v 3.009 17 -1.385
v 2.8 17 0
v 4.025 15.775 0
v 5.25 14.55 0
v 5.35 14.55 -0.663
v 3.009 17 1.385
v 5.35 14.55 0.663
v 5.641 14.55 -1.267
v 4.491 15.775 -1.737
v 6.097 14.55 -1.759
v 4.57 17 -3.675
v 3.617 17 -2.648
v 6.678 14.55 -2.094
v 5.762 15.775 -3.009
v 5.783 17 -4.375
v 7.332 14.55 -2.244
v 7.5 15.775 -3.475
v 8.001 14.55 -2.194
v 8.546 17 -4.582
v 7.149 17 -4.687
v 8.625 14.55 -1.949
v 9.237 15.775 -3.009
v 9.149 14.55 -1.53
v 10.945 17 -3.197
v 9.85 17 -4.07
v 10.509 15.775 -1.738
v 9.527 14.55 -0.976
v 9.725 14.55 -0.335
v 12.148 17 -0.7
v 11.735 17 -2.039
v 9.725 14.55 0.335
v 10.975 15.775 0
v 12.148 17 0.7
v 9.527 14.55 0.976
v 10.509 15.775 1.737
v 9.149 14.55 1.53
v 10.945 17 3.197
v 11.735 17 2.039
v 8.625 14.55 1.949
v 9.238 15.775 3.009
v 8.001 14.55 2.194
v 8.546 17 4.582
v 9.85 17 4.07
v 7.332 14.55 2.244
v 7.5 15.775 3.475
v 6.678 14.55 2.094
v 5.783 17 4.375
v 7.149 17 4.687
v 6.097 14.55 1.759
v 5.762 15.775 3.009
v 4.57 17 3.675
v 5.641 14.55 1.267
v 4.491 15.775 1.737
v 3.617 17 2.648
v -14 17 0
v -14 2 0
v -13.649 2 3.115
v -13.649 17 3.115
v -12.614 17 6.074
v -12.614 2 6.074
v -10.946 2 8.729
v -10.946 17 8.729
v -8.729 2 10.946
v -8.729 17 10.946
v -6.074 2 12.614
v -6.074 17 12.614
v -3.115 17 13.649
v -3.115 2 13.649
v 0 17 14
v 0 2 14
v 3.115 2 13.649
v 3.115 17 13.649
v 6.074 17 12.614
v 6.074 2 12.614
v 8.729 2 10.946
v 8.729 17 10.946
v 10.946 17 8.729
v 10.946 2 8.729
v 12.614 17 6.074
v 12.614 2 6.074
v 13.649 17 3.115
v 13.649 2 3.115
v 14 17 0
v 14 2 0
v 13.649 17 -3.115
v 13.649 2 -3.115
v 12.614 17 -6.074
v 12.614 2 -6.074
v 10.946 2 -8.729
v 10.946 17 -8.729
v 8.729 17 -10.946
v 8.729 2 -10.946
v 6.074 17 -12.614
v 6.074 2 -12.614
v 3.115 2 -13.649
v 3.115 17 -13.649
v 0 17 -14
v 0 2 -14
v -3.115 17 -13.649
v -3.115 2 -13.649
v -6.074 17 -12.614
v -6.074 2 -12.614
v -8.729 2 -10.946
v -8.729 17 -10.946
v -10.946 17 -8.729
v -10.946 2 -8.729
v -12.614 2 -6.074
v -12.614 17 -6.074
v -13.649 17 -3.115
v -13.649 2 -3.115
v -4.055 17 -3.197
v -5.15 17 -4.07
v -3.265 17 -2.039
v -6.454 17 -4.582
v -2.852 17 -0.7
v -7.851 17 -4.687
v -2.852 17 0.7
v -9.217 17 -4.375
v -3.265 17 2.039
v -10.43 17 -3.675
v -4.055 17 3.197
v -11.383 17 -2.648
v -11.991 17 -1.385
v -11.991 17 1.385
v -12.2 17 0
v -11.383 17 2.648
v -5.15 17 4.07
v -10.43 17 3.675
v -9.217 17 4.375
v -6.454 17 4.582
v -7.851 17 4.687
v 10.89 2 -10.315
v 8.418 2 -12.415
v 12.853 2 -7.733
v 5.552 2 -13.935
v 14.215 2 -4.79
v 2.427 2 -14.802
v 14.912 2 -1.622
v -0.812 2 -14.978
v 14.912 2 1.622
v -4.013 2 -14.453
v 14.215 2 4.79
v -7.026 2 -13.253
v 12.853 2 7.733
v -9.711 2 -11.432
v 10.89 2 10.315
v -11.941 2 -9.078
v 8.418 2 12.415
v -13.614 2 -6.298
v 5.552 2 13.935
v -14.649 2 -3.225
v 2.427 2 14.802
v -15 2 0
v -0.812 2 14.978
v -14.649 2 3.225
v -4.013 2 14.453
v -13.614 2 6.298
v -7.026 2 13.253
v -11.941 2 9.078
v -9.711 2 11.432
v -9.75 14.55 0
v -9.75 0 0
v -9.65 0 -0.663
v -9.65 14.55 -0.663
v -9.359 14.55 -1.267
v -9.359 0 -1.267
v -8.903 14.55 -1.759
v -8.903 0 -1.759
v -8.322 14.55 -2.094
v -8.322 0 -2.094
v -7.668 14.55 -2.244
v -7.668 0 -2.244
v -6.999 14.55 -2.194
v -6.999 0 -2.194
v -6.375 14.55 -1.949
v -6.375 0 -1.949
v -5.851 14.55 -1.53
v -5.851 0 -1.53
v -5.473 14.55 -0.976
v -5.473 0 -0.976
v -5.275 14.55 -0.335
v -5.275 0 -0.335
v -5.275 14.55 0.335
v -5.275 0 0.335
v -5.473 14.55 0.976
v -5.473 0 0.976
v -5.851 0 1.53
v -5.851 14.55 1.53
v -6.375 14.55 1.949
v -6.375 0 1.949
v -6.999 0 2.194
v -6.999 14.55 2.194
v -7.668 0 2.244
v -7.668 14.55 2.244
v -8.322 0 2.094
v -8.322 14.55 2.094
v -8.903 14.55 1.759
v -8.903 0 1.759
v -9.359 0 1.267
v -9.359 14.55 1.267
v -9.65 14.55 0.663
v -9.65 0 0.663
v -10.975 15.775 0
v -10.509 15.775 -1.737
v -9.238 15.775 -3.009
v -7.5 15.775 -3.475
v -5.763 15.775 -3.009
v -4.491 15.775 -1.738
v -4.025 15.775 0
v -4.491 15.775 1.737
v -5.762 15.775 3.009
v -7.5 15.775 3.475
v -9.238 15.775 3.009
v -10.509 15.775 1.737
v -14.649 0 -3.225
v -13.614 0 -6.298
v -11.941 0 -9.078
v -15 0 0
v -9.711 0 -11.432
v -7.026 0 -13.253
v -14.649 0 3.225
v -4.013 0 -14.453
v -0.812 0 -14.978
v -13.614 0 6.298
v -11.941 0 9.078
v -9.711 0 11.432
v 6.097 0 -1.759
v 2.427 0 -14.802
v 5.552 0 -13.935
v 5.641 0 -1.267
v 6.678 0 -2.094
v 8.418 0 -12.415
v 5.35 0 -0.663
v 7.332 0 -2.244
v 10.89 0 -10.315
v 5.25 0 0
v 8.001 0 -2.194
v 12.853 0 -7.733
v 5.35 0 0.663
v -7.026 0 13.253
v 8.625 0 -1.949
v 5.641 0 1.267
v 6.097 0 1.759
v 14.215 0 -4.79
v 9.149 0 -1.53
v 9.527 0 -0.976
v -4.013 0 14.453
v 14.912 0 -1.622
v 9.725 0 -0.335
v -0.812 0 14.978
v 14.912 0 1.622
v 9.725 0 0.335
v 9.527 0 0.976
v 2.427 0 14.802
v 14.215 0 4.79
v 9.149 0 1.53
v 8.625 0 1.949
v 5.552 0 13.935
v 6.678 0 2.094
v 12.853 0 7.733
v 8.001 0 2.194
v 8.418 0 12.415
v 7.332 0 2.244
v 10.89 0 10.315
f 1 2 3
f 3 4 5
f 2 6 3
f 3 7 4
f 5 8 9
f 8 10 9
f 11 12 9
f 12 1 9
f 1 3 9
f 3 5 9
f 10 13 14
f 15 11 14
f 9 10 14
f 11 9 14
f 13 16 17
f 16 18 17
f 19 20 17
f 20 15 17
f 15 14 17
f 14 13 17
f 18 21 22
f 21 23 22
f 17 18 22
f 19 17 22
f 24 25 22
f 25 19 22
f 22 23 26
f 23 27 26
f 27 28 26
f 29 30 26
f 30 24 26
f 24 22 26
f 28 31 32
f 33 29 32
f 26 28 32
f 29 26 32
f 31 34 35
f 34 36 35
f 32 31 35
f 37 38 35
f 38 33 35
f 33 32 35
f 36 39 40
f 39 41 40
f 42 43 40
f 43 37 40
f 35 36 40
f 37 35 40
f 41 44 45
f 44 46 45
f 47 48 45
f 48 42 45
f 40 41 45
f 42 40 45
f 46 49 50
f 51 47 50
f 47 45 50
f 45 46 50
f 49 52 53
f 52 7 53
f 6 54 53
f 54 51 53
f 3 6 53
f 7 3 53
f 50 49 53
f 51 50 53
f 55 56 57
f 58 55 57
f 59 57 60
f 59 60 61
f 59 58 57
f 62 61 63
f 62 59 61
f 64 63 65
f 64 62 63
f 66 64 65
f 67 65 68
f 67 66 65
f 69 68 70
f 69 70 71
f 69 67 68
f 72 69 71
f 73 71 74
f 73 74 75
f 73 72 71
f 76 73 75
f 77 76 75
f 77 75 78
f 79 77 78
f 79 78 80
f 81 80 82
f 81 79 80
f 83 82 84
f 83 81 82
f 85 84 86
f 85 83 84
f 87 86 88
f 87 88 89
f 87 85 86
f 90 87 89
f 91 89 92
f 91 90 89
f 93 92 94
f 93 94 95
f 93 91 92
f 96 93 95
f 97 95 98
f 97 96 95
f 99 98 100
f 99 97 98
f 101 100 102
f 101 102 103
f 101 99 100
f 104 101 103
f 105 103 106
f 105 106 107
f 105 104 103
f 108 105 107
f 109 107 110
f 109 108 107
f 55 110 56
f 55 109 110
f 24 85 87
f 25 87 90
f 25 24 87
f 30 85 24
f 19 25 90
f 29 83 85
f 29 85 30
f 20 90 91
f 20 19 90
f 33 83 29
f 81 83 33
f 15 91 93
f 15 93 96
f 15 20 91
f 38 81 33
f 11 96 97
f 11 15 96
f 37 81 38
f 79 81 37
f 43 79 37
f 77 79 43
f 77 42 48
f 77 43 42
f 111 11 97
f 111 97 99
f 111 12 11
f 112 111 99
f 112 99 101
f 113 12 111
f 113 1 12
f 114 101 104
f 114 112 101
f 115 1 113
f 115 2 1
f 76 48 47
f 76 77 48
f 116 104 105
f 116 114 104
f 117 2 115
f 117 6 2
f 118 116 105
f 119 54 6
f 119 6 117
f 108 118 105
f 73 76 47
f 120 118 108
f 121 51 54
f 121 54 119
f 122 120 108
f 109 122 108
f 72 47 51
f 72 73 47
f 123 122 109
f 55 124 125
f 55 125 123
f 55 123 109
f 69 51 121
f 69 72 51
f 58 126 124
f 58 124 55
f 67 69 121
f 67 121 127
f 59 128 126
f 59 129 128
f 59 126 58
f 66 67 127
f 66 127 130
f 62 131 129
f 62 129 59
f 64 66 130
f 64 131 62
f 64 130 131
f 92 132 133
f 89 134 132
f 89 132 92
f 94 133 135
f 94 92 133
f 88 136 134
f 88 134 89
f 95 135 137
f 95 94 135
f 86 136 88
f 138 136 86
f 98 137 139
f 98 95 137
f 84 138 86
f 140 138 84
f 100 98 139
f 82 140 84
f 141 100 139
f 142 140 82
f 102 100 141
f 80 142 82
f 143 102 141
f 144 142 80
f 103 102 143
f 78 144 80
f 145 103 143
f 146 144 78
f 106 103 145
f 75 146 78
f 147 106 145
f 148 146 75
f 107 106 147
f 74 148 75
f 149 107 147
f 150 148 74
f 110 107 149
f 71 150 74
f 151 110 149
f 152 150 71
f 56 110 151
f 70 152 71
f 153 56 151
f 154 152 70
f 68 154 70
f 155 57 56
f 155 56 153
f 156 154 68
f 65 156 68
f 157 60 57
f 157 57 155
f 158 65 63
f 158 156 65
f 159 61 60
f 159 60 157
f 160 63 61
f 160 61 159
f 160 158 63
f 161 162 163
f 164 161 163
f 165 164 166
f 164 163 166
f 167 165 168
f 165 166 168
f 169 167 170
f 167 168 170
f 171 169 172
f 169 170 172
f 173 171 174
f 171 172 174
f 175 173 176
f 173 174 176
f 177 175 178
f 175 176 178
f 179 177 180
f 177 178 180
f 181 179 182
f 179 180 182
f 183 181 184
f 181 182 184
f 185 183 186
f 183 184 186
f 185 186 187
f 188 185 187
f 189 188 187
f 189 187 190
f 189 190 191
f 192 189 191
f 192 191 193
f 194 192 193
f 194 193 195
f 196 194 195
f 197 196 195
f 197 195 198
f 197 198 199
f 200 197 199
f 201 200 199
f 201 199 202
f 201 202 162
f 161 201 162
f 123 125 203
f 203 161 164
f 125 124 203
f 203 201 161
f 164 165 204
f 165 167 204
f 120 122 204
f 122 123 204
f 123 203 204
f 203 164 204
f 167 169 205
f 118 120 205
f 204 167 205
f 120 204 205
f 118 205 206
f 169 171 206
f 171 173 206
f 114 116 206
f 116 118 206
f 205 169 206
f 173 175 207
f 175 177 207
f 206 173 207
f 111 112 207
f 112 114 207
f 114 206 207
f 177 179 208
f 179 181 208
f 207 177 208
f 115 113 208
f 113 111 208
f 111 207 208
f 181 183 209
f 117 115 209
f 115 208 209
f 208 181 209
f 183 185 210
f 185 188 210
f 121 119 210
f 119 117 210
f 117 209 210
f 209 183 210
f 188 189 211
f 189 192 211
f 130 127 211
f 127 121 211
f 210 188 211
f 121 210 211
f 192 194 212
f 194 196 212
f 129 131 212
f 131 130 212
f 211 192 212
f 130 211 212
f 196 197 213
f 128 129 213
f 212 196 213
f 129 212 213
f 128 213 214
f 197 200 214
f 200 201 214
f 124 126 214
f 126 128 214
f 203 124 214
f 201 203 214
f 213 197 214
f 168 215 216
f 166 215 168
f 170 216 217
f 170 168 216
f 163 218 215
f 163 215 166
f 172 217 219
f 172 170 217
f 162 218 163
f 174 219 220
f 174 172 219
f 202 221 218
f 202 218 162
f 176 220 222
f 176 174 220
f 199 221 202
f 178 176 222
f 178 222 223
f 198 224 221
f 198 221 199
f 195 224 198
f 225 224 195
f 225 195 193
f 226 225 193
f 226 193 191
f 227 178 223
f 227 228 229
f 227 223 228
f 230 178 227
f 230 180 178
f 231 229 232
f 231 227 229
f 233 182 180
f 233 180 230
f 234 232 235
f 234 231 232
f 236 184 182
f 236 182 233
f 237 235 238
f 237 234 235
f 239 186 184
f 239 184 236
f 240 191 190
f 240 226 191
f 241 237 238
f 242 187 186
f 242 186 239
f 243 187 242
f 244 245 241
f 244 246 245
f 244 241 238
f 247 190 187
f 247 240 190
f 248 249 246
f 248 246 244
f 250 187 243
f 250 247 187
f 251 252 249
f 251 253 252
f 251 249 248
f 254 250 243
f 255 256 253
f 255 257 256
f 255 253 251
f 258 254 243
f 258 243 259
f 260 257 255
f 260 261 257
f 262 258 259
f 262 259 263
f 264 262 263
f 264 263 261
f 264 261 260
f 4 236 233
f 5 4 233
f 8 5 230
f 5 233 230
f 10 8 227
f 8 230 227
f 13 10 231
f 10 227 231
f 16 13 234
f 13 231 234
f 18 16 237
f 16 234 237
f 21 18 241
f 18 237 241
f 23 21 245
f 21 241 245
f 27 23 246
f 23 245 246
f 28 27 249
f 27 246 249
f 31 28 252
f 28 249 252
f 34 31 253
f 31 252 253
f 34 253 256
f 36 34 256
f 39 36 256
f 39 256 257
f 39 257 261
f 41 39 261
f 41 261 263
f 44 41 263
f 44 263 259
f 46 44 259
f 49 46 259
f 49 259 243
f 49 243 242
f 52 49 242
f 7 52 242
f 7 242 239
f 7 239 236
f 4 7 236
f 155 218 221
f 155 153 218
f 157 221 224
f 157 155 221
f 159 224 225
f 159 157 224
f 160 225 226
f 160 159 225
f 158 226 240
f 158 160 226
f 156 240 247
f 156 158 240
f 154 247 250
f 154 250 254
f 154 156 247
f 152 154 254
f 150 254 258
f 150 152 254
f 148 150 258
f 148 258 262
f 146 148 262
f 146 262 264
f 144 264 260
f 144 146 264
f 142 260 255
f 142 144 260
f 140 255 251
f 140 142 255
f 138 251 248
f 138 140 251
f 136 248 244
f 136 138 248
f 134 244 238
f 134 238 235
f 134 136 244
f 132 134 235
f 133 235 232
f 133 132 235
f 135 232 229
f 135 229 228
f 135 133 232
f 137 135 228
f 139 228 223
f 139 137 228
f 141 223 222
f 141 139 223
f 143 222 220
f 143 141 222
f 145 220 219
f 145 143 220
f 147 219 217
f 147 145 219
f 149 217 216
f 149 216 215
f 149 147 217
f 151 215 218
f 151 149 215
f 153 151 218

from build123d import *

# Parameters (mm, degrees)
HOLE_WIZARD_M4_1_D           = 4.5
HOLE_WIZARD_M4_1_DEPTH       = 17
HOLE_WIZARD_M4_1_CSINK_D     = 9.4
HOLE_WIZARD_M4_1_CSINK_ANGLE = 90


with BuildPart() as part:
    # 스케치1 → 회전1 (revolve)
    with BuildSketch(Plane.XY):
        Polygon((0, 0), (-15, 0), (-15, 2), (-14, 2), (-14, 17), (0, 17), align=None)
    revolve(axis=Axis((0, 0, 0), (0, 1, 0)))

    # M4 접시 머리 나사용 카운터싱크1
    with Locations(Plane(origin=(0, 17, 0), x_dir=(1, 0, 0), z_dir=(0, 1, 0))):
        with Locations((-7.5, 0), (7.5, 0)):
            CounterSinkHole(HOLE_WIZARD_M4_1_D / 2, HOLE_WIZARD_M4_1_CSINK_D / 2, depth=HOLE_WIZARD_M4_1_DEPTH, counter_sink_angle=HOLE_WIZARD_M4_1_CSINK_ANGLE)


solid = part.part
